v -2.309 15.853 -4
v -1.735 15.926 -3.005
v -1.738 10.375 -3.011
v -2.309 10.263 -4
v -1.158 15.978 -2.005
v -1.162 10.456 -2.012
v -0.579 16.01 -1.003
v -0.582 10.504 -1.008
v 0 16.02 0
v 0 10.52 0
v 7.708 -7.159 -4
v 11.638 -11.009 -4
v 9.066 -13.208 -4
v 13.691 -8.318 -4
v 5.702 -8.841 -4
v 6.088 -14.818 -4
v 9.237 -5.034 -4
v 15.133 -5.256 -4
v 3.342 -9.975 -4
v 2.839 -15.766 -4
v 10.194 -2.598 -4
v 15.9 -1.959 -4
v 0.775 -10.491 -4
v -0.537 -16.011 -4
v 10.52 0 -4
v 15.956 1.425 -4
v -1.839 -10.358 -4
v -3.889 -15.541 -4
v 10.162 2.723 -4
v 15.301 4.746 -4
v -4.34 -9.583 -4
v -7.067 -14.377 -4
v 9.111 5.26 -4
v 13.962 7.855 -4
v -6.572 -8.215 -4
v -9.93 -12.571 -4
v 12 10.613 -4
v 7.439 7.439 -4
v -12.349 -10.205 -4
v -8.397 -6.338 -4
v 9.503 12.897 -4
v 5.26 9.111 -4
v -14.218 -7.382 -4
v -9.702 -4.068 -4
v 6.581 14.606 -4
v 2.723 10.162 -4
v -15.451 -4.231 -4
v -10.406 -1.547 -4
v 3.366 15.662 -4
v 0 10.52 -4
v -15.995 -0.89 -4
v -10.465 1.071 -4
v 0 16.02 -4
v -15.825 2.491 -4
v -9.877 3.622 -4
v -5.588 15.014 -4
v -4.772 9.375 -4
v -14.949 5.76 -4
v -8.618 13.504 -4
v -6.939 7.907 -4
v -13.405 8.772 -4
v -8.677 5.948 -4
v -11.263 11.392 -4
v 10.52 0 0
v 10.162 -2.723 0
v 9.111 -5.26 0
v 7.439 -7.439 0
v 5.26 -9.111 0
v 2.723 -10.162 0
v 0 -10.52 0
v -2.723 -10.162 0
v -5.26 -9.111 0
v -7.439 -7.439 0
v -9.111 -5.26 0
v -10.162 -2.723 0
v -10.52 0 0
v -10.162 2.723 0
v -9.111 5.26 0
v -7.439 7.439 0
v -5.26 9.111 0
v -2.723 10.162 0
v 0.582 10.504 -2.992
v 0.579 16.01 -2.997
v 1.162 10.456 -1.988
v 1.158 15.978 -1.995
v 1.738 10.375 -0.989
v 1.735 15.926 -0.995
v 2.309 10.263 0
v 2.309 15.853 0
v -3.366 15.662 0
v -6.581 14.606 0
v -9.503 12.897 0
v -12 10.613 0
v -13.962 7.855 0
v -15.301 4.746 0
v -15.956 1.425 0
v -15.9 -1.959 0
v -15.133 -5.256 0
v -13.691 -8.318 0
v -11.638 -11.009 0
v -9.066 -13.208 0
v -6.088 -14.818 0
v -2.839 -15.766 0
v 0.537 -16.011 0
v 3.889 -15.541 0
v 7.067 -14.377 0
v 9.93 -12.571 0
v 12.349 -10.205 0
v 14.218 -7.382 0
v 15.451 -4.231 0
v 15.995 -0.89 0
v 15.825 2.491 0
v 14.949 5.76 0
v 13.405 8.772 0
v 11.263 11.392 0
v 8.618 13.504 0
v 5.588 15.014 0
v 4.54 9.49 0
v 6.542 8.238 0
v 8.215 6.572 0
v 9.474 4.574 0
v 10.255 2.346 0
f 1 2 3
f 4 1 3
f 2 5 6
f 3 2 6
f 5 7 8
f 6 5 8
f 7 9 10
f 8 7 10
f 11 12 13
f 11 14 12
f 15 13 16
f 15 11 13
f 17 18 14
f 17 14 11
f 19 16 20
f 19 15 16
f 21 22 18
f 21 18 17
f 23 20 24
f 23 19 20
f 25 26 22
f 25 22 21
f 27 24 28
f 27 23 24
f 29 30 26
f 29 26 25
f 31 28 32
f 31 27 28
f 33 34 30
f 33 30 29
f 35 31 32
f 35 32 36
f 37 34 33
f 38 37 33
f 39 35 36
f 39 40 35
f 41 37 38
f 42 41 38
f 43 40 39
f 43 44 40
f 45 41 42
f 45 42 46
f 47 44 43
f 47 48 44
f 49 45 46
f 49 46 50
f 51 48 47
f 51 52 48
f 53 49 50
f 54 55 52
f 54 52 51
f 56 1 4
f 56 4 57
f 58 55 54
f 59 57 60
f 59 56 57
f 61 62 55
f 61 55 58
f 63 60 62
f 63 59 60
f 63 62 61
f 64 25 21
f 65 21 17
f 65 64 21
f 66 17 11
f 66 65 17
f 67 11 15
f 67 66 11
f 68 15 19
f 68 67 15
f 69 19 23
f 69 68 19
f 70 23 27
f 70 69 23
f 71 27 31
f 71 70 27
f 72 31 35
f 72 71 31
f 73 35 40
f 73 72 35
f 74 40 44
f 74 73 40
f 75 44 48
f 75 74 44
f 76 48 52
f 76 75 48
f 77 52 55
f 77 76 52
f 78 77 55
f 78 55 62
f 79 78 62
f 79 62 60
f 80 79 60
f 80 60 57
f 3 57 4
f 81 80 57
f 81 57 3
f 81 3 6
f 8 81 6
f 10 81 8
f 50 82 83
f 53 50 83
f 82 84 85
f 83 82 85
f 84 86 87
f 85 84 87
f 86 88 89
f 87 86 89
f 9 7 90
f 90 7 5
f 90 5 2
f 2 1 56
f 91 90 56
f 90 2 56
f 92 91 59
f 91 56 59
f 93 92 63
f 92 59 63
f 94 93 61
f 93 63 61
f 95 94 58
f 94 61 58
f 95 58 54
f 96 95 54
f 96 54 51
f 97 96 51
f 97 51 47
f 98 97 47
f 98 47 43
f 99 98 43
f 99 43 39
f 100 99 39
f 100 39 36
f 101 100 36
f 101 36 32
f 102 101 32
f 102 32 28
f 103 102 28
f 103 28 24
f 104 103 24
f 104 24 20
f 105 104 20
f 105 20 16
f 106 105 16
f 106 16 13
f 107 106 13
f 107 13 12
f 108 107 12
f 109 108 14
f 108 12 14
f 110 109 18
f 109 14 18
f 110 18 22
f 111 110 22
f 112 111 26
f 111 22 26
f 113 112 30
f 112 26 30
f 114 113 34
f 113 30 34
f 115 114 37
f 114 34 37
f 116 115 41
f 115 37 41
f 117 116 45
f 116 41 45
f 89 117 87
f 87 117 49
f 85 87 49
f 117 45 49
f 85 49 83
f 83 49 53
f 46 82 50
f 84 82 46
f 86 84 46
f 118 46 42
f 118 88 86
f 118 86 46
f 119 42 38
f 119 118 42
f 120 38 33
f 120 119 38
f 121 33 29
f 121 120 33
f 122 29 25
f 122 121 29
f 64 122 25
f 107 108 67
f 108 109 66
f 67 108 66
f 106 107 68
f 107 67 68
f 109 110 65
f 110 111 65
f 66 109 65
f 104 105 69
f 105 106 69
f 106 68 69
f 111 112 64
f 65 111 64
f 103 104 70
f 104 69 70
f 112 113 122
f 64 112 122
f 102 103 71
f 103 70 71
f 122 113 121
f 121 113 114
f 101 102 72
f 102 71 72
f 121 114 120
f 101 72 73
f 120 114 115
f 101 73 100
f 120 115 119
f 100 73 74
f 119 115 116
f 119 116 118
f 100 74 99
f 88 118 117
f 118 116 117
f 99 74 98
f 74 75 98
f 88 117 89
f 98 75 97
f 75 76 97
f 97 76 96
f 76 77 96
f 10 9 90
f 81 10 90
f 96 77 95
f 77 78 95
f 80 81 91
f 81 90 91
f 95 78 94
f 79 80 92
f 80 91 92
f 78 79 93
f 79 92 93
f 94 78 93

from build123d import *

# Parameters (mm, degrees)
SKETCH_1_W          = 16.02
SKETCH_1_H          = 4
CUT_EXTRUDE_1_DEPTH = 24.006103538
DRAFT_1_ANGLE       = -30
DRAFT_2_ANGLE       = 30
SKETCH_3_W          = 10.52
SKETCH_3_H          = 4


with BuildPart() as part:
    # 草图1 → 旋转1 (revolve)
    with BuildSketch(Plane(origin=(0, 0, 0), x_dir=(1, 0, 0), z_dir=(0, 1, 0))):
        with Locations((8.01, 2)):
            Rectangle(SKETCH_1_W, SKETCH_1_H)
    revolve(axis=Axis((0, 0, -4), (0, 0, 1)))

    # 草图2 → 切除-拉伸1 (cut, through all)
    with BuildSketch(Plane.XY):
        with BuildLine():
            Line((0, 16.02), (0, 10.52))
            ThreePointArc((0, 10.52), (1.16180729, 10.455649373), (2.309401077, 10.263384757))
            Line((2.309401077, 10.263384757), (2.309401077, 15.852667494))
            ThreePointArc((2.309401077, 15.852667494), (1.157727677, 15.978112111), (0, 16.02))
        make_face()
    extrude(amount=-CUT_EXTRUDE_1_DEPTH, mode=Mode.SUBTRACT)

    # 拔模1
    draft_1_faces = [part.faces().sort_by_distance(p)[0] for p in [
        (0, 13.27, -2),
    ]]
    draft(draft_1_faces, Plane.XY, DRAFT_1_ANGLE)

    # 拔模2
    draft_2_faces = [part.faces().sort_by_distance(p)[0] for p in [
        (2.309401077, 13.058026125, -2),
    ]]
    draft(draft_2_faces, Plane.XY, DRAFT_2_ANGLE)

    # 草图3 → 切除-旋转1 (revolve, cut)
    with BuildSketch(Plane.XZ):
        with Locations((5.26, -2)):
            Rectangle(SKETCH_3_W, SKETCH_3_H)
    revolve(axis=Axis((0, 0, 0), (0, 0, -1)), mode=Mode.SUBTRACT)


solid = part.part
